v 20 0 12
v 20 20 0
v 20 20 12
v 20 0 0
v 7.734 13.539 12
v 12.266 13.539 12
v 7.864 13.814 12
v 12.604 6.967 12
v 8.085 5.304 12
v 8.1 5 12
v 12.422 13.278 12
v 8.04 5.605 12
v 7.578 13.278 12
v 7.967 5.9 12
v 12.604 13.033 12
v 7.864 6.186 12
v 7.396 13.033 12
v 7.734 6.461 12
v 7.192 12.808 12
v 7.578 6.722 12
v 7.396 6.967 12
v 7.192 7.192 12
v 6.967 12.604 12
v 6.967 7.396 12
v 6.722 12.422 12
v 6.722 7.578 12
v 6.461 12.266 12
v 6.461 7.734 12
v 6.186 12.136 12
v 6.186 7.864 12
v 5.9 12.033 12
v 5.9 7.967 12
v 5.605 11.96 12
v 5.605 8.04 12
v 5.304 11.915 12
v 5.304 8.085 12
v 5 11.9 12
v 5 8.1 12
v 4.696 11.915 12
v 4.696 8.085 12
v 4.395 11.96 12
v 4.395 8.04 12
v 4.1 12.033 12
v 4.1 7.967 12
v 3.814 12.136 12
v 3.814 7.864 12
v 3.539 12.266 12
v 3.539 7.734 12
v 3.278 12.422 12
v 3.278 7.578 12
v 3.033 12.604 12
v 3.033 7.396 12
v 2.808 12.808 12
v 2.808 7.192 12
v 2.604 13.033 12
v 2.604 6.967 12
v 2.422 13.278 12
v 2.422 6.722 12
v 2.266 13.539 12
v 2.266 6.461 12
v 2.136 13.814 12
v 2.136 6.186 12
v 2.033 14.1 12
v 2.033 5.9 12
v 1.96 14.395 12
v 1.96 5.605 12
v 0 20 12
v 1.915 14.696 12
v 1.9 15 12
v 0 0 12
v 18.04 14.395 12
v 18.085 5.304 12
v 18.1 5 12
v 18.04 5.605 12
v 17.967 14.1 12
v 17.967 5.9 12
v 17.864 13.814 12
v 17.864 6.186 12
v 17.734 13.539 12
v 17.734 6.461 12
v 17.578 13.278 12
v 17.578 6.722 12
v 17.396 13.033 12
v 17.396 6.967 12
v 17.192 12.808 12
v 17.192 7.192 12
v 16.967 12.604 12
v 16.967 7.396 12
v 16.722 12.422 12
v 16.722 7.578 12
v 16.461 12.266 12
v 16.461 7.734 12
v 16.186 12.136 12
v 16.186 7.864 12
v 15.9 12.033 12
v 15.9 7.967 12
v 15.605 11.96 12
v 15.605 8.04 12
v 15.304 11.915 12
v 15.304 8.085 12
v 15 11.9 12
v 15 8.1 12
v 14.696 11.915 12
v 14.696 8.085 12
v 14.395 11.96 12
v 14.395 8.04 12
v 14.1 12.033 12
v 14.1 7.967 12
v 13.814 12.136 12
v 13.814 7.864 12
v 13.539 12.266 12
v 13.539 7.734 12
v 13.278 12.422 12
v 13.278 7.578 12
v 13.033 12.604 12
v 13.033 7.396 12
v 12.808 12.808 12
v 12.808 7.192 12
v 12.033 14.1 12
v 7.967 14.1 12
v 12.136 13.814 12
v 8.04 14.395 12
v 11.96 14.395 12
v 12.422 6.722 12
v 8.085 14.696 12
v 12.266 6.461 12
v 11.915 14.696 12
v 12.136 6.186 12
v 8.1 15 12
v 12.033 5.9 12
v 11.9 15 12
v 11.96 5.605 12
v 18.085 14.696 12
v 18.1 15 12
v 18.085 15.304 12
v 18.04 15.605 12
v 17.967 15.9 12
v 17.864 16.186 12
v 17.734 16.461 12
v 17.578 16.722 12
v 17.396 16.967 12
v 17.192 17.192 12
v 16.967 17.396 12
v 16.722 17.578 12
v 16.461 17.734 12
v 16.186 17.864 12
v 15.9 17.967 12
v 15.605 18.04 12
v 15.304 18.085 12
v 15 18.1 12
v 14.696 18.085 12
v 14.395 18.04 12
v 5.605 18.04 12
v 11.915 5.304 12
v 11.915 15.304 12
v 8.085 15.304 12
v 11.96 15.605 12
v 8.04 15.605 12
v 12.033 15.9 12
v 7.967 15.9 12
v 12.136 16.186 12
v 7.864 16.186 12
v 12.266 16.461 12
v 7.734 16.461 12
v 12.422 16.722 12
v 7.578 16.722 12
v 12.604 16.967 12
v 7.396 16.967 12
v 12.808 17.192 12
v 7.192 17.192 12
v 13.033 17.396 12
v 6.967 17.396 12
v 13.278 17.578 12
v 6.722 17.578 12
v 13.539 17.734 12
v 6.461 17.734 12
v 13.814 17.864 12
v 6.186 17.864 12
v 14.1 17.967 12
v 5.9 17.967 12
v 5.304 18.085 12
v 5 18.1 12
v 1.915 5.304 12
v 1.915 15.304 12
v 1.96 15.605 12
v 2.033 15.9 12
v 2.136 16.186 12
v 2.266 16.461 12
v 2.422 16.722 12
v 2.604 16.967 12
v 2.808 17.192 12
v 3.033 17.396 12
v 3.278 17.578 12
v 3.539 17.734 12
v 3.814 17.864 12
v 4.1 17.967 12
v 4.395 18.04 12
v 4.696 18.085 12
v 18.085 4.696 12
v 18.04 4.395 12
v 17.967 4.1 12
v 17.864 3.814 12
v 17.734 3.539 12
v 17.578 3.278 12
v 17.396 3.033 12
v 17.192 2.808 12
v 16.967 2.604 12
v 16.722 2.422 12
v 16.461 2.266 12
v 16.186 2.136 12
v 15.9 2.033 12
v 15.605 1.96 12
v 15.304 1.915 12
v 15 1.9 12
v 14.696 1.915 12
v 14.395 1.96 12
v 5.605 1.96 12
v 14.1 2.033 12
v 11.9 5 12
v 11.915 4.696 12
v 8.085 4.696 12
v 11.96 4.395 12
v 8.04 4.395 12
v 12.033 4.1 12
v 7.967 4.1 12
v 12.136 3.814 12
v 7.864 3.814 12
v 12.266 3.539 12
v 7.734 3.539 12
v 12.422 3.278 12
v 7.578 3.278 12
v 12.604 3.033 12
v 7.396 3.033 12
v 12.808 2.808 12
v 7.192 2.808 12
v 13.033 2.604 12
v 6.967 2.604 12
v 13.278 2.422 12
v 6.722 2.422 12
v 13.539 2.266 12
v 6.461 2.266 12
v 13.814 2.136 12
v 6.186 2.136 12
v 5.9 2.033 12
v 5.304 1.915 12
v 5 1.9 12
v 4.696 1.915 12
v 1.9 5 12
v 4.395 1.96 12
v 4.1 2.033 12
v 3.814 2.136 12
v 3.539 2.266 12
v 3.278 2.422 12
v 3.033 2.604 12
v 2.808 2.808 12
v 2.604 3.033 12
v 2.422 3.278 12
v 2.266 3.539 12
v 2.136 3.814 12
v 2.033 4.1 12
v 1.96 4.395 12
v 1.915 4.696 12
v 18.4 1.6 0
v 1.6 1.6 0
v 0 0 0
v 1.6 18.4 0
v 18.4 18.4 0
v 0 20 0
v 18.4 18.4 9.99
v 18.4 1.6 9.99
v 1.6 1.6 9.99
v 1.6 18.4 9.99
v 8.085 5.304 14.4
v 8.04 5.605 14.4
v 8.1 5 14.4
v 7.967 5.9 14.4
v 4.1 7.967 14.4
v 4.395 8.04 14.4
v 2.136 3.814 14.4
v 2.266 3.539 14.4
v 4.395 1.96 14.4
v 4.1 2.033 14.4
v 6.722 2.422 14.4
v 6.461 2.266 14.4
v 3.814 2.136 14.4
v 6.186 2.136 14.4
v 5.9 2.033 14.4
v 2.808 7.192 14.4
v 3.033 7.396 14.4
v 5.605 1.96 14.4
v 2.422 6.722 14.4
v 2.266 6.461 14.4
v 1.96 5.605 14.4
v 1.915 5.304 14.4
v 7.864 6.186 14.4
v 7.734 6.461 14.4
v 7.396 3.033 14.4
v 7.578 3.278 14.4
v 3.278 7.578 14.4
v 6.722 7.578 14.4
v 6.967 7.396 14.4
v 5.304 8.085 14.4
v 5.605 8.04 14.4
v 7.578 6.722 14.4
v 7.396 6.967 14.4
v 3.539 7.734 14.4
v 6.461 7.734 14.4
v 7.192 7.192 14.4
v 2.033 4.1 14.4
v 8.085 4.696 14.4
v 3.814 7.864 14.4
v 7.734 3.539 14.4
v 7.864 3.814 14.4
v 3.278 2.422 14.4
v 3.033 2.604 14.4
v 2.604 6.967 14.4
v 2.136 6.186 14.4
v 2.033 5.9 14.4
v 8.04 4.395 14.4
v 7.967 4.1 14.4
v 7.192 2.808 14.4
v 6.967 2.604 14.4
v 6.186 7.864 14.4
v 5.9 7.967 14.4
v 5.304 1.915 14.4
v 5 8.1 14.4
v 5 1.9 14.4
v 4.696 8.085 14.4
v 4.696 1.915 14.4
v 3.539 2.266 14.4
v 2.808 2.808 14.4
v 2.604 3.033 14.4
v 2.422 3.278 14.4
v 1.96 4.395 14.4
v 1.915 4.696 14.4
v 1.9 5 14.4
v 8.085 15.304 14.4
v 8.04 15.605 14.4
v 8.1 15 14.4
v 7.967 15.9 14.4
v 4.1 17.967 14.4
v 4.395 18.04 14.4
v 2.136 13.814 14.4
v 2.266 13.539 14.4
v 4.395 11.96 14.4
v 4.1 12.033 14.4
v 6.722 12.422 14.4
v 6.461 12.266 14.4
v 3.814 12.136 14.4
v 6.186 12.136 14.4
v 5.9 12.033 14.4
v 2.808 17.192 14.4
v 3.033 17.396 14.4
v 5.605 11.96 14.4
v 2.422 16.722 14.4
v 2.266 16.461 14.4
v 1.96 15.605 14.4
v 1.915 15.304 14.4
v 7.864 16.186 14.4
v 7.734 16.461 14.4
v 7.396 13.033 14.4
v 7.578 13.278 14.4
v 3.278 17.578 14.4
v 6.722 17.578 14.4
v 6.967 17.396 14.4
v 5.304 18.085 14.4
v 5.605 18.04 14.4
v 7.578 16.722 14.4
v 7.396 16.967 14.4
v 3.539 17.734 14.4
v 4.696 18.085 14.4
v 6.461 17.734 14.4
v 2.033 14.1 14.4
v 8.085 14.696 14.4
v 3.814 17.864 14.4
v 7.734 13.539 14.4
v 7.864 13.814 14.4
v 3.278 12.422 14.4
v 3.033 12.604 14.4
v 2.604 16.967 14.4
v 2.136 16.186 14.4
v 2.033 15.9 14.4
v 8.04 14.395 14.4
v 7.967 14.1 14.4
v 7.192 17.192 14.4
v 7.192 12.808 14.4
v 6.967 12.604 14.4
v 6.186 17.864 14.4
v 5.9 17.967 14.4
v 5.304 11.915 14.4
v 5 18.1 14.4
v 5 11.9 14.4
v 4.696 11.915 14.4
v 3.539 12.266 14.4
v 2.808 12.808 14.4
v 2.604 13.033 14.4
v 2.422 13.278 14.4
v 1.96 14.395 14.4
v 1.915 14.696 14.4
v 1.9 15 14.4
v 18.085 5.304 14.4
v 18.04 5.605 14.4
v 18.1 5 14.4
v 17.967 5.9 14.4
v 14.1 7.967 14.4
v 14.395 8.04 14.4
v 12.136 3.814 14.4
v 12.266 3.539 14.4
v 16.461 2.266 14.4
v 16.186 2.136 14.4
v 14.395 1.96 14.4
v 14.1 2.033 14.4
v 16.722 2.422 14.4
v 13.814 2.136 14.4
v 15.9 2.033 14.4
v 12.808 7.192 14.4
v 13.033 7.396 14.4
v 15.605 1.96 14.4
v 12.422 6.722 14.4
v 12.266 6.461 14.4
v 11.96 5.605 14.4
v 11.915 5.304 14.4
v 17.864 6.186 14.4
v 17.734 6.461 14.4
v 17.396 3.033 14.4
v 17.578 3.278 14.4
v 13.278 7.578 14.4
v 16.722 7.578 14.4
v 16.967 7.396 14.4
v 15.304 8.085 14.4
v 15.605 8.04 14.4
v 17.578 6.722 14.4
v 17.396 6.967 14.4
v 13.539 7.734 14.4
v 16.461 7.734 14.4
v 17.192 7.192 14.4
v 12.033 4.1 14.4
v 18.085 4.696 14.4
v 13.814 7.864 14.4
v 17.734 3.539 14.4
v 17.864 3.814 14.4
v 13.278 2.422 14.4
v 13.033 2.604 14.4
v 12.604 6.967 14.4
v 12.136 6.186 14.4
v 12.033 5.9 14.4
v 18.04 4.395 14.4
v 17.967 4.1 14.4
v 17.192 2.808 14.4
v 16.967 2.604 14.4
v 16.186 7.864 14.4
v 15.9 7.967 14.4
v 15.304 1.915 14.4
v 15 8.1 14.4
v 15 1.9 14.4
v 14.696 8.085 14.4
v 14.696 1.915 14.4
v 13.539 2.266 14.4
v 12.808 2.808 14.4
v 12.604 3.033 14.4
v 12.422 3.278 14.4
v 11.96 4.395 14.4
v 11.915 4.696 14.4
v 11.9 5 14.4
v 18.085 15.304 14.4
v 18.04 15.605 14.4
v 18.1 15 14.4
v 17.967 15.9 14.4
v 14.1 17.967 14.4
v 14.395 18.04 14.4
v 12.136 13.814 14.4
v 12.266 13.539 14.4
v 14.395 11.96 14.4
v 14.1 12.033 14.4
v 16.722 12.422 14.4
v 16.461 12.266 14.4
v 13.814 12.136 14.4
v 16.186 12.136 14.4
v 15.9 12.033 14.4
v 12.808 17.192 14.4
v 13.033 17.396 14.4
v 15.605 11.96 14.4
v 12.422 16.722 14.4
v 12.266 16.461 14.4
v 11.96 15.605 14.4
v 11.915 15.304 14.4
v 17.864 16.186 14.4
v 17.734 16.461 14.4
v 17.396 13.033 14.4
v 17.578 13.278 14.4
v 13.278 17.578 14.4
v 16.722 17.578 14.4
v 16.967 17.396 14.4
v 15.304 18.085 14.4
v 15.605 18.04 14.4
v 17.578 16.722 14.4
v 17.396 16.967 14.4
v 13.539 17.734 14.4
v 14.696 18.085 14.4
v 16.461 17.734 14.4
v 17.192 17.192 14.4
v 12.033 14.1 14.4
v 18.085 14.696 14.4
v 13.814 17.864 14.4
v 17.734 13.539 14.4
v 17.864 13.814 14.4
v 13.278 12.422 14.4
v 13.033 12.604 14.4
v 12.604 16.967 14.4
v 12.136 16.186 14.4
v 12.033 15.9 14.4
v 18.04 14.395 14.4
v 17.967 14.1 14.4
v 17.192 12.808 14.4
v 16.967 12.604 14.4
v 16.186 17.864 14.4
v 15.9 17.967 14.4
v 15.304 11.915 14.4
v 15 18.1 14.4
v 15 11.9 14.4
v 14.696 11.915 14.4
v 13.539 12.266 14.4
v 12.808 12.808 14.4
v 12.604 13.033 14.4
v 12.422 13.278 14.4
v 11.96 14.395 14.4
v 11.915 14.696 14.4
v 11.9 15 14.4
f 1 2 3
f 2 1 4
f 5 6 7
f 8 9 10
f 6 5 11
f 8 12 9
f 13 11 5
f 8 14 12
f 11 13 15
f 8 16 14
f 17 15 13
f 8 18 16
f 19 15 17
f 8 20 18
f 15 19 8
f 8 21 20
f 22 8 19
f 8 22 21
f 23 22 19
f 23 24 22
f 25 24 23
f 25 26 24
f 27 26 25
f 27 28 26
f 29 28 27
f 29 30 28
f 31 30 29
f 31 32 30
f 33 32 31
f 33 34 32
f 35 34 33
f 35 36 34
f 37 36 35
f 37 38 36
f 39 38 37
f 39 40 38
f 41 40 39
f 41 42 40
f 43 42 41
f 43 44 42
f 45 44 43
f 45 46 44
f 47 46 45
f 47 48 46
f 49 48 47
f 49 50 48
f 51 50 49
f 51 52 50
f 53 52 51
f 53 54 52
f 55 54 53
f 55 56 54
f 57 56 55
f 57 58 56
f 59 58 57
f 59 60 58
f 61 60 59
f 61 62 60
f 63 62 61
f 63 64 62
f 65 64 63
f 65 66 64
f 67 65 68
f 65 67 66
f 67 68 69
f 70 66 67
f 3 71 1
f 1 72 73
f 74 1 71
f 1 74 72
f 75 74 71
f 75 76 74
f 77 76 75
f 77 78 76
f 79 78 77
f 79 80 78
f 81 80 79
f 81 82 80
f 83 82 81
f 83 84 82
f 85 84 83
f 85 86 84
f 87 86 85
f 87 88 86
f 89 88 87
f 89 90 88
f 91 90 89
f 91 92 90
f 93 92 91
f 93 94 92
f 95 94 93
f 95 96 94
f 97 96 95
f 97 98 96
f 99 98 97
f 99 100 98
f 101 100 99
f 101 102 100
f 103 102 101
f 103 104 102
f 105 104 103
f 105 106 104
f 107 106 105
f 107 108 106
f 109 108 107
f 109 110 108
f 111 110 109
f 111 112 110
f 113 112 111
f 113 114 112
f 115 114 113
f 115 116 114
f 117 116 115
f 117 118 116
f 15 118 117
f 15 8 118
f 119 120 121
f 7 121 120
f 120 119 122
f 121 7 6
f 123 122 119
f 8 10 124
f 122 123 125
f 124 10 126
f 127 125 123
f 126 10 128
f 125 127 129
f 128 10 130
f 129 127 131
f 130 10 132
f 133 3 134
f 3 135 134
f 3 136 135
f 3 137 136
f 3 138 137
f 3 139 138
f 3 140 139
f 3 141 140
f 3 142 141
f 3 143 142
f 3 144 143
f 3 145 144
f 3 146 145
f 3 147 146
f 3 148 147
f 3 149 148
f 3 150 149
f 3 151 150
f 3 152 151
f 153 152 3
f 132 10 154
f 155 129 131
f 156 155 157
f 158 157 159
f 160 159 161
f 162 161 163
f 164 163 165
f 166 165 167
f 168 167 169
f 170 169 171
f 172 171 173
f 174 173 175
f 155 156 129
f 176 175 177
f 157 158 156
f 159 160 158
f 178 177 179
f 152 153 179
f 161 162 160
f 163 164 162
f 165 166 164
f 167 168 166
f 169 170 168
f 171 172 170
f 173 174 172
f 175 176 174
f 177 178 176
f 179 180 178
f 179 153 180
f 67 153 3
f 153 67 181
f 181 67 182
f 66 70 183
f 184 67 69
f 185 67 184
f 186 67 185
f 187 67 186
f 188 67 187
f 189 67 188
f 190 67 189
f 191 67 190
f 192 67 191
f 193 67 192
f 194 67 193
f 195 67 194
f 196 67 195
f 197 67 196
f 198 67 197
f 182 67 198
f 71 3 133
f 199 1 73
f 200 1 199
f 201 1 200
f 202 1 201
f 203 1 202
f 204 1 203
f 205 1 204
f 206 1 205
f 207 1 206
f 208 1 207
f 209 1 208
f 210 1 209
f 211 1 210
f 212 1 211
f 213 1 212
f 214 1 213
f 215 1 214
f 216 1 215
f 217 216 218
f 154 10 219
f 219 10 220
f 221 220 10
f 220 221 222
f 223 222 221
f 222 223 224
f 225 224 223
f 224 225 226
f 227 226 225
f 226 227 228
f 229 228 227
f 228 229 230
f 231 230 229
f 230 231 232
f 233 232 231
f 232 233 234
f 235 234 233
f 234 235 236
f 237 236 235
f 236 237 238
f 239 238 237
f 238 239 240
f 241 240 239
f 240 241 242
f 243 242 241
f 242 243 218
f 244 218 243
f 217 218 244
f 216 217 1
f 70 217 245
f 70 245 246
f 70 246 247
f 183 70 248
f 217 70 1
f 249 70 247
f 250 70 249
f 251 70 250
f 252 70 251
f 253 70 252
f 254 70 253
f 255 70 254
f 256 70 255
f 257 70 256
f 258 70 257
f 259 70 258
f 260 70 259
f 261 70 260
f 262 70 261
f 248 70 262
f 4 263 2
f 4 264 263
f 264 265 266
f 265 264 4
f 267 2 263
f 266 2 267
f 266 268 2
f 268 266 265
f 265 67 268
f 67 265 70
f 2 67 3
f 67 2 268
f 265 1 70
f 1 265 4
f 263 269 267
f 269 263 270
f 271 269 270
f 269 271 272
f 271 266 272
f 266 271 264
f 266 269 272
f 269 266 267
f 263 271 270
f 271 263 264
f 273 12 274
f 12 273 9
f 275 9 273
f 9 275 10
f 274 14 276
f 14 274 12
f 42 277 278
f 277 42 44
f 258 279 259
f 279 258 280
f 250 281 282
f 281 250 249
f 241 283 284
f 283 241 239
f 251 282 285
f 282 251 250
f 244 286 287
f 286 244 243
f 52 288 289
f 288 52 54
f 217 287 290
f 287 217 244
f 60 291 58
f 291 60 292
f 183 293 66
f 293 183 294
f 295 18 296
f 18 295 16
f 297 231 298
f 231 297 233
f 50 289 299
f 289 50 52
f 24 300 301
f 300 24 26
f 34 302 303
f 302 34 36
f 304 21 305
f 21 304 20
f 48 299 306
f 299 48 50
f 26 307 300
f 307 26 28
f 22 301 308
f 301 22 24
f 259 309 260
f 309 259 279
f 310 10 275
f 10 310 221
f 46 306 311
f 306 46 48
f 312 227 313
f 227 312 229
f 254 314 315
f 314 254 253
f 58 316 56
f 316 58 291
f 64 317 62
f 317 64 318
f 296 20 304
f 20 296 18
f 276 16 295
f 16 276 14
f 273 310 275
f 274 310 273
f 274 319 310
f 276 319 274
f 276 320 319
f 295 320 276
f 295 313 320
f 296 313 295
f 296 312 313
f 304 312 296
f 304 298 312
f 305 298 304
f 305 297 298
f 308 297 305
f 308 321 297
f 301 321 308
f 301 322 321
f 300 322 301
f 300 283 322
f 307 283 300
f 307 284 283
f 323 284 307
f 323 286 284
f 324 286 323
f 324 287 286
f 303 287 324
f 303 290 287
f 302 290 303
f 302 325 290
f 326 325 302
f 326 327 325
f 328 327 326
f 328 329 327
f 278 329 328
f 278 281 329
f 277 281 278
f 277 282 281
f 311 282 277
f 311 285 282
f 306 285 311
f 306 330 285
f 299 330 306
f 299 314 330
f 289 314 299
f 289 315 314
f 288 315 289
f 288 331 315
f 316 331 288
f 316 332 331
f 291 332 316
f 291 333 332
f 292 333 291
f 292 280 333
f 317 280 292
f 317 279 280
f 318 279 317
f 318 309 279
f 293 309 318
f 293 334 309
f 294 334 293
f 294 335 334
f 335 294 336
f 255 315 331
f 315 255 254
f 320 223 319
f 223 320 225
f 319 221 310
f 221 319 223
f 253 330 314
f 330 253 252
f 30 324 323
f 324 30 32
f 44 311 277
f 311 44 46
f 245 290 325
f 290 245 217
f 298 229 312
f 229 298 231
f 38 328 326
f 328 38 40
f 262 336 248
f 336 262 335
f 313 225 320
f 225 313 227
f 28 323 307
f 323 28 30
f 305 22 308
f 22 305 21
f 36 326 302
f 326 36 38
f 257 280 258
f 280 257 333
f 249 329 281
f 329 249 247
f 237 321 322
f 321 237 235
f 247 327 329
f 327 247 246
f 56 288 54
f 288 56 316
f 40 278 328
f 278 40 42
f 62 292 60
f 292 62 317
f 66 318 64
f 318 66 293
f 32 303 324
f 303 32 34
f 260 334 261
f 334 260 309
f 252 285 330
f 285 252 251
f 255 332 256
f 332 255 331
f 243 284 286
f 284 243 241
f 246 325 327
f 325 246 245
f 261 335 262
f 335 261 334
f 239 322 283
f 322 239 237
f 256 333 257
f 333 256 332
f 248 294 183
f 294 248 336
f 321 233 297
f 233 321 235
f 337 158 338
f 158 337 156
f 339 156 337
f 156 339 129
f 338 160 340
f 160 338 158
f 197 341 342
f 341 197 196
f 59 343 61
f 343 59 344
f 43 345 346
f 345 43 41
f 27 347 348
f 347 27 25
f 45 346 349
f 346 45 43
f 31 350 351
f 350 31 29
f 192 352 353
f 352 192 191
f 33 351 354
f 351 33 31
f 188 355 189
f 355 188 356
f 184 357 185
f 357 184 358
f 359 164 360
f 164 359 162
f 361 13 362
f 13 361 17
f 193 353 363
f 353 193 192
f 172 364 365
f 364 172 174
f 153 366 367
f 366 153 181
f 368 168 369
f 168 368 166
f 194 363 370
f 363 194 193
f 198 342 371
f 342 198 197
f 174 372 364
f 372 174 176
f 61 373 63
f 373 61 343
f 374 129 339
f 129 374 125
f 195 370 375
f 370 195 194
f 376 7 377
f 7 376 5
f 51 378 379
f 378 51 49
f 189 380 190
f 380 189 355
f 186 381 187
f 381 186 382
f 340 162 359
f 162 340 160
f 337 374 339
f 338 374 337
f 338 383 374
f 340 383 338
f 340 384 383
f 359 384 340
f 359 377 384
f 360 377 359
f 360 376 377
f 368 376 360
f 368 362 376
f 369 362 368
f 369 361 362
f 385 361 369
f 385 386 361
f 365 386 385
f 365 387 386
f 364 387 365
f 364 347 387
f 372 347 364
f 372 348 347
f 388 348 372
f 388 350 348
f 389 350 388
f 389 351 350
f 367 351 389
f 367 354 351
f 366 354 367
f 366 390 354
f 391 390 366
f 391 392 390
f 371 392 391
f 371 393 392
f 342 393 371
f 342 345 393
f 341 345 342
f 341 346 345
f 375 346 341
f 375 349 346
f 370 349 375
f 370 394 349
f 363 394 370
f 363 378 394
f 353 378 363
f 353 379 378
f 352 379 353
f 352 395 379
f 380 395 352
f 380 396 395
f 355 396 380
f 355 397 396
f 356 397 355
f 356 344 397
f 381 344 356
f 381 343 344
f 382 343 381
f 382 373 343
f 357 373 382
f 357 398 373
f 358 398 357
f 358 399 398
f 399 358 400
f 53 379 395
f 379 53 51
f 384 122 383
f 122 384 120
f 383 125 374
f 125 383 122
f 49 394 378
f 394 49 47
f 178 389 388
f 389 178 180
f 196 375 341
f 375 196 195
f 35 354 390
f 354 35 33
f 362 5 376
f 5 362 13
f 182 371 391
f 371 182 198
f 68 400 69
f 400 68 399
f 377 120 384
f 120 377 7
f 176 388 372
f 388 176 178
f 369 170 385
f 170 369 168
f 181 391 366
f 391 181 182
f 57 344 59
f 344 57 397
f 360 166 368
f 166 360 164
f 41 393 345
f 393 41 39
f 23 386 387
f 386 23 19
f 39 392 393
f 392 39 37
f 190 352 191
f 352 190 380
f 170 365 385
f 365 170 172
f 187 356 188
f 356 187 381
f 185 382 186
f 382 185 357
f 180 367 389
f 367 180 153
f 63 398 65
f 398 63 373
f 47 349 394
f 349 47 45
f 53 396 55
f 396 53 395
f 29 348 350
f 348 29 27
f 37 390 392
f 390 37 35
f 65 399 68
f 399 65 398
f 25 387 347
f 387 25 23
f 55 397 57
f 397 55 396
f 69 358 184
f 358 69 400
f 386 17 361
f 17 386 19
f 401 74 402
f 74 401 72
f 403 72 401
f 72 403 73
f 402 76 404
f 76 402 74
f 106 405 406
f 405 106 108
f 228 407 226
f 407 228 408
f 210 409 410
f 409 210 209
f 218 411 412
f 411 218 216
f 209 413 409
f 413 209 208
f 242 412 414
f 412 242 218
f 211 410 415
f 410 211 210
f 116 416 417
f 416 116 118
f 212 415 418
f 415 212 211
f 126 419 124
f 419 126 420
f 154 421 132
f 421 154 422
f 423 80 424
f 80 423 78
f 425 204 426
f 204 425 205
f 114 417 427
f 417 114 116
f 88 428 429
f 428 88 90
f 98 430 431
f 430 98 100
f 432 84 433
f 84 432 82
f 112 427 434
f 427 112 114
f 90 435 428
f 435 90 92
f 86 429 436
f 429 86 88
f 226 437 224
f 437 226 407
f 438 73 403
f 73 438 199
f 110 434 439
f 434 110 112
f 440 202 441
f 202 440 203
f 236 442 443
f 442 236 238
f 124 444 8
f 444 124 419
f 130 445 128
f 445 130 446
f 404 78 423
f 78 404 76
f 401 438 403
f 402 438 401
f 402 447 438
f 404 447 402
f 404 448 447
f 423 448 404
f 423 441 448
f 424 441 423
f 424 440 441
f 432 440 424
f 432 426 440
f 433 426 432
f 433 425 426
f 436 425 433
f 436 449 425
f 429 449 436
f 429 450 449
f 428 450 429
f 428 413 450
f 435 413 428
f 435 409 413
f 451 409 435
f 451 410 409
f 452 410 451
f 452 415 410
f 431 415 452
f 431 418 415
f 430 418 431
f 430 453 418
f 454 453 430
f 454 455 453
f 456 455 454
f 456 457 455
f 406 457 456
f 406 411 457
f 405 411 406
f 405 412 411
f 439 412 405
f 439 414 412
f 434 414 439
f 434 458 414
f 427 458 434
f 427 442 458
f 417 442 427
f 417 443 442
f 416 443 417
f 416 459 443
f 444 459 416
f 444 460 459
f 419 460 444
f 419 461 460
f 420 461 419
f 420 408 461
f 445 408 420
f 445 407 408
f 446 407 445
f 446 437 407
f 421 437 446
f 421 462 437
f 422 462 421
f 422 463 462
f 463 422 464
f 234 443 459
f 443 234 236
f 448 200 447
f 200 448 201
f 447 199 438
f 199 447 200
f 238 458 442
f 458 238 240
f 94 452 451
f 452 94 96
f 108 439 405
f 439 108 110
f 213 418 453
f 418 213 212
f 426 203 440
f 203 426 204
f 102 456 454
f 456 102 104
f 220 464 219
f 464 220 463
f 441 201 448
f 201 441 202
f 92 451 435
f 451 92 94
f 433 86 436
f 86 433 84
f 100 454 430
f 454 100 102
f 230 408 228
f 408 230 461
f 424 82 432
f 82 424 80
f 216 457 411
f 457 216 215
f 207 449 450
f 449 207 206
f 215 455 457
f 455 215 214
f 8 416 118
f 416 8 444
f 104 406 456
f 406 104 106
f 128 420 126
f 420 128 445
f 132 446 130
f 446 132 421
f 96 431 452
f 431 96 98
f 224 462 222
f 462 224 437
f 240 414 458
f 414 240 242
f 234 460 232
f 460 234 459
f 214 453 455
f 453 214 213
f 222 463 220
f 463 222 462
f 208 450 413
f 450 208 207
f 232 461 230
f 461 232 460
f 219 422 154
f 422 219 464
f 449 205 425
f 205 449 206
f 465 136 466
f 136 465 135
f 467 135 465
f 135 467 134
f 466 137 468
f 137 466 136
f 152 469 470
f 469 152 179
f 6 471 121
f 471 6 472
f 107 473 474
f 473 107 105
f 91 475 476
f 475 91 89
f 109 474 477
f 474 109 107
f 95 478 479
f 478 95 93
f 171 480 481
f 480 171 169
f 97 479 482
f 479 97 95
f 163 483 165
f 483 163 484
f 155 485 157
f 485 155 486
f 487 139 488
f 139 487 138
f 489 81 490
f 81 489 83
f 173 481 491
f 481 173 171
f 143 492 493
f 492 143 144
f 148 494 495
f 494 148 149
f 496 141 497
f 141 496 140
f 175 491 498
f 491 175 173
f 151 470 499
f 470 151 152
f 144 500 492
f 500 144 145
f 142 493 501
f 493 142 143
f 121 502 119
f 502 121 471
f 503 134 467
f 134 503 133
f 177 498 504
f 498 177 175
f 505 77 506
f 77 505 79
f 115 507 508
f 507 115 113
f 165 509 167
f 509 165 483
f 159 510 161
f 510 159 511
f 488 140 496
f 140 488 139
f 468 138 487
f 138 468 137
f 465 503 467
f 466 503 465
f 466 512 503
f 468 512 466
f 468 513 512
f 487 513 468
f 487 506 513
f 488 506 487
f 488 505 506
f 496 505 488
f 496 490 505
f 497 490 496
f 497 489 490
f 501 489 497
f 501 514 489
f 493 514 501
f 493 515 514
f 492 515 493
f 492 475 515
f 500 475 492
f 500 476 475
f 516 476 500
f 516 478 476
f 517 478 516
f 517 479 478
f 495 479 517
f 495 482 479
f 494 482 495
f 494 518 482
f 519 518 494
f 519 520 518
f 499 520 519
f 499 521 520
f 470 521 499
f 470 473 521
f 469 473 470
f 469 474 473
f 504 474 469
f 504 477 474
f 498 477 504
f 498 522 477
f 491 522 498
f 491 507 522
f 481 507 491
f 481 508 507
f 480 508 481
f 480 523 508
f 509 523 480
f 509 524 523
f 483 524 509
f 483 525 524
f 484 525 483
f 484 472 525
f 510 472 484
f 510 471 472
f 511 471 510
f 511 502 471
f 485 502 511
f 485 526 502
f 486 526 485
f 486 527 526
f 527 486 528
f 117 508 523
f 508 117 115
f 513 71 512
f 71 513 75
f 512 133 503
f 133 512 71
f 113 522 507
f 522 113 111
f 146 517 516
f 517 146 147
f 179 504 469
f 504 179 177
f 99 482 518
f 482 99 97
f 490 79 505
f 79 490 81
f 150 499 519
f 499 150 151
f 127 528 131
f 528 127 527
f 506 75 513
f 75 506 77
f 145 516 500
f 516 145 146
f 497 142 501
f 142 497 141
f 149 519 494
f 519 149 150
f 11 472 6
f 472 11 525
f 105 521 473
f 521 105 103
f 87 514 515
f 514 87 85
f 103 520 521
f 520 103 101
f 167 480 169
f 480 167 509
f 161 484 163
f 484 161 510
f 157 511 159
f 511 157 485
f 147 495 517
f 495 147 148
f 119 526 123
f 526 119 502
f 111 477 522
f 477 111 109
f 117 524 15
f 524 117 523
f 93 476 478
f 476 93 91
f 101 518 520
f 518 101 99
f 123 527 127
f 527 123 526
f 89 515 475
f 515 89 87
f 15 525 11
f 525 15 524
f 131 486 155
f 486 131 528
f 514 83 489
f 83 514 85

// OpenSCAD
// EthioBricks Heritage Building System (EHB-10) prototype
// 2x2 test brick — engineering prototype only, NOT certified as a children's toy.
$fn = 64;
module brick_2x2() {
    pitch = 10;
    w = 20;
    d = 20;
    h = 12;
    wall = 1.6;
    stud_d = 6.2;
    stud_h = 2.4;

    difference() {
        // Main shell
        cube([w,d,h], center=false);
        // Bottom cavity: leaves side walls and top
        translate([wall,wall,-0.01])
            cube([w-2*wall,d-2*wall,h-2.0], center=false);
    }
    // Four top studs
    for (x=[pitch/2, 3*pitch/2])
        for (y=[pitch/2, 3*pitch/2])
            translate([x,y,h])
                cylinder(d=stud_d,h=stud_h);
}
brick_2x2();
